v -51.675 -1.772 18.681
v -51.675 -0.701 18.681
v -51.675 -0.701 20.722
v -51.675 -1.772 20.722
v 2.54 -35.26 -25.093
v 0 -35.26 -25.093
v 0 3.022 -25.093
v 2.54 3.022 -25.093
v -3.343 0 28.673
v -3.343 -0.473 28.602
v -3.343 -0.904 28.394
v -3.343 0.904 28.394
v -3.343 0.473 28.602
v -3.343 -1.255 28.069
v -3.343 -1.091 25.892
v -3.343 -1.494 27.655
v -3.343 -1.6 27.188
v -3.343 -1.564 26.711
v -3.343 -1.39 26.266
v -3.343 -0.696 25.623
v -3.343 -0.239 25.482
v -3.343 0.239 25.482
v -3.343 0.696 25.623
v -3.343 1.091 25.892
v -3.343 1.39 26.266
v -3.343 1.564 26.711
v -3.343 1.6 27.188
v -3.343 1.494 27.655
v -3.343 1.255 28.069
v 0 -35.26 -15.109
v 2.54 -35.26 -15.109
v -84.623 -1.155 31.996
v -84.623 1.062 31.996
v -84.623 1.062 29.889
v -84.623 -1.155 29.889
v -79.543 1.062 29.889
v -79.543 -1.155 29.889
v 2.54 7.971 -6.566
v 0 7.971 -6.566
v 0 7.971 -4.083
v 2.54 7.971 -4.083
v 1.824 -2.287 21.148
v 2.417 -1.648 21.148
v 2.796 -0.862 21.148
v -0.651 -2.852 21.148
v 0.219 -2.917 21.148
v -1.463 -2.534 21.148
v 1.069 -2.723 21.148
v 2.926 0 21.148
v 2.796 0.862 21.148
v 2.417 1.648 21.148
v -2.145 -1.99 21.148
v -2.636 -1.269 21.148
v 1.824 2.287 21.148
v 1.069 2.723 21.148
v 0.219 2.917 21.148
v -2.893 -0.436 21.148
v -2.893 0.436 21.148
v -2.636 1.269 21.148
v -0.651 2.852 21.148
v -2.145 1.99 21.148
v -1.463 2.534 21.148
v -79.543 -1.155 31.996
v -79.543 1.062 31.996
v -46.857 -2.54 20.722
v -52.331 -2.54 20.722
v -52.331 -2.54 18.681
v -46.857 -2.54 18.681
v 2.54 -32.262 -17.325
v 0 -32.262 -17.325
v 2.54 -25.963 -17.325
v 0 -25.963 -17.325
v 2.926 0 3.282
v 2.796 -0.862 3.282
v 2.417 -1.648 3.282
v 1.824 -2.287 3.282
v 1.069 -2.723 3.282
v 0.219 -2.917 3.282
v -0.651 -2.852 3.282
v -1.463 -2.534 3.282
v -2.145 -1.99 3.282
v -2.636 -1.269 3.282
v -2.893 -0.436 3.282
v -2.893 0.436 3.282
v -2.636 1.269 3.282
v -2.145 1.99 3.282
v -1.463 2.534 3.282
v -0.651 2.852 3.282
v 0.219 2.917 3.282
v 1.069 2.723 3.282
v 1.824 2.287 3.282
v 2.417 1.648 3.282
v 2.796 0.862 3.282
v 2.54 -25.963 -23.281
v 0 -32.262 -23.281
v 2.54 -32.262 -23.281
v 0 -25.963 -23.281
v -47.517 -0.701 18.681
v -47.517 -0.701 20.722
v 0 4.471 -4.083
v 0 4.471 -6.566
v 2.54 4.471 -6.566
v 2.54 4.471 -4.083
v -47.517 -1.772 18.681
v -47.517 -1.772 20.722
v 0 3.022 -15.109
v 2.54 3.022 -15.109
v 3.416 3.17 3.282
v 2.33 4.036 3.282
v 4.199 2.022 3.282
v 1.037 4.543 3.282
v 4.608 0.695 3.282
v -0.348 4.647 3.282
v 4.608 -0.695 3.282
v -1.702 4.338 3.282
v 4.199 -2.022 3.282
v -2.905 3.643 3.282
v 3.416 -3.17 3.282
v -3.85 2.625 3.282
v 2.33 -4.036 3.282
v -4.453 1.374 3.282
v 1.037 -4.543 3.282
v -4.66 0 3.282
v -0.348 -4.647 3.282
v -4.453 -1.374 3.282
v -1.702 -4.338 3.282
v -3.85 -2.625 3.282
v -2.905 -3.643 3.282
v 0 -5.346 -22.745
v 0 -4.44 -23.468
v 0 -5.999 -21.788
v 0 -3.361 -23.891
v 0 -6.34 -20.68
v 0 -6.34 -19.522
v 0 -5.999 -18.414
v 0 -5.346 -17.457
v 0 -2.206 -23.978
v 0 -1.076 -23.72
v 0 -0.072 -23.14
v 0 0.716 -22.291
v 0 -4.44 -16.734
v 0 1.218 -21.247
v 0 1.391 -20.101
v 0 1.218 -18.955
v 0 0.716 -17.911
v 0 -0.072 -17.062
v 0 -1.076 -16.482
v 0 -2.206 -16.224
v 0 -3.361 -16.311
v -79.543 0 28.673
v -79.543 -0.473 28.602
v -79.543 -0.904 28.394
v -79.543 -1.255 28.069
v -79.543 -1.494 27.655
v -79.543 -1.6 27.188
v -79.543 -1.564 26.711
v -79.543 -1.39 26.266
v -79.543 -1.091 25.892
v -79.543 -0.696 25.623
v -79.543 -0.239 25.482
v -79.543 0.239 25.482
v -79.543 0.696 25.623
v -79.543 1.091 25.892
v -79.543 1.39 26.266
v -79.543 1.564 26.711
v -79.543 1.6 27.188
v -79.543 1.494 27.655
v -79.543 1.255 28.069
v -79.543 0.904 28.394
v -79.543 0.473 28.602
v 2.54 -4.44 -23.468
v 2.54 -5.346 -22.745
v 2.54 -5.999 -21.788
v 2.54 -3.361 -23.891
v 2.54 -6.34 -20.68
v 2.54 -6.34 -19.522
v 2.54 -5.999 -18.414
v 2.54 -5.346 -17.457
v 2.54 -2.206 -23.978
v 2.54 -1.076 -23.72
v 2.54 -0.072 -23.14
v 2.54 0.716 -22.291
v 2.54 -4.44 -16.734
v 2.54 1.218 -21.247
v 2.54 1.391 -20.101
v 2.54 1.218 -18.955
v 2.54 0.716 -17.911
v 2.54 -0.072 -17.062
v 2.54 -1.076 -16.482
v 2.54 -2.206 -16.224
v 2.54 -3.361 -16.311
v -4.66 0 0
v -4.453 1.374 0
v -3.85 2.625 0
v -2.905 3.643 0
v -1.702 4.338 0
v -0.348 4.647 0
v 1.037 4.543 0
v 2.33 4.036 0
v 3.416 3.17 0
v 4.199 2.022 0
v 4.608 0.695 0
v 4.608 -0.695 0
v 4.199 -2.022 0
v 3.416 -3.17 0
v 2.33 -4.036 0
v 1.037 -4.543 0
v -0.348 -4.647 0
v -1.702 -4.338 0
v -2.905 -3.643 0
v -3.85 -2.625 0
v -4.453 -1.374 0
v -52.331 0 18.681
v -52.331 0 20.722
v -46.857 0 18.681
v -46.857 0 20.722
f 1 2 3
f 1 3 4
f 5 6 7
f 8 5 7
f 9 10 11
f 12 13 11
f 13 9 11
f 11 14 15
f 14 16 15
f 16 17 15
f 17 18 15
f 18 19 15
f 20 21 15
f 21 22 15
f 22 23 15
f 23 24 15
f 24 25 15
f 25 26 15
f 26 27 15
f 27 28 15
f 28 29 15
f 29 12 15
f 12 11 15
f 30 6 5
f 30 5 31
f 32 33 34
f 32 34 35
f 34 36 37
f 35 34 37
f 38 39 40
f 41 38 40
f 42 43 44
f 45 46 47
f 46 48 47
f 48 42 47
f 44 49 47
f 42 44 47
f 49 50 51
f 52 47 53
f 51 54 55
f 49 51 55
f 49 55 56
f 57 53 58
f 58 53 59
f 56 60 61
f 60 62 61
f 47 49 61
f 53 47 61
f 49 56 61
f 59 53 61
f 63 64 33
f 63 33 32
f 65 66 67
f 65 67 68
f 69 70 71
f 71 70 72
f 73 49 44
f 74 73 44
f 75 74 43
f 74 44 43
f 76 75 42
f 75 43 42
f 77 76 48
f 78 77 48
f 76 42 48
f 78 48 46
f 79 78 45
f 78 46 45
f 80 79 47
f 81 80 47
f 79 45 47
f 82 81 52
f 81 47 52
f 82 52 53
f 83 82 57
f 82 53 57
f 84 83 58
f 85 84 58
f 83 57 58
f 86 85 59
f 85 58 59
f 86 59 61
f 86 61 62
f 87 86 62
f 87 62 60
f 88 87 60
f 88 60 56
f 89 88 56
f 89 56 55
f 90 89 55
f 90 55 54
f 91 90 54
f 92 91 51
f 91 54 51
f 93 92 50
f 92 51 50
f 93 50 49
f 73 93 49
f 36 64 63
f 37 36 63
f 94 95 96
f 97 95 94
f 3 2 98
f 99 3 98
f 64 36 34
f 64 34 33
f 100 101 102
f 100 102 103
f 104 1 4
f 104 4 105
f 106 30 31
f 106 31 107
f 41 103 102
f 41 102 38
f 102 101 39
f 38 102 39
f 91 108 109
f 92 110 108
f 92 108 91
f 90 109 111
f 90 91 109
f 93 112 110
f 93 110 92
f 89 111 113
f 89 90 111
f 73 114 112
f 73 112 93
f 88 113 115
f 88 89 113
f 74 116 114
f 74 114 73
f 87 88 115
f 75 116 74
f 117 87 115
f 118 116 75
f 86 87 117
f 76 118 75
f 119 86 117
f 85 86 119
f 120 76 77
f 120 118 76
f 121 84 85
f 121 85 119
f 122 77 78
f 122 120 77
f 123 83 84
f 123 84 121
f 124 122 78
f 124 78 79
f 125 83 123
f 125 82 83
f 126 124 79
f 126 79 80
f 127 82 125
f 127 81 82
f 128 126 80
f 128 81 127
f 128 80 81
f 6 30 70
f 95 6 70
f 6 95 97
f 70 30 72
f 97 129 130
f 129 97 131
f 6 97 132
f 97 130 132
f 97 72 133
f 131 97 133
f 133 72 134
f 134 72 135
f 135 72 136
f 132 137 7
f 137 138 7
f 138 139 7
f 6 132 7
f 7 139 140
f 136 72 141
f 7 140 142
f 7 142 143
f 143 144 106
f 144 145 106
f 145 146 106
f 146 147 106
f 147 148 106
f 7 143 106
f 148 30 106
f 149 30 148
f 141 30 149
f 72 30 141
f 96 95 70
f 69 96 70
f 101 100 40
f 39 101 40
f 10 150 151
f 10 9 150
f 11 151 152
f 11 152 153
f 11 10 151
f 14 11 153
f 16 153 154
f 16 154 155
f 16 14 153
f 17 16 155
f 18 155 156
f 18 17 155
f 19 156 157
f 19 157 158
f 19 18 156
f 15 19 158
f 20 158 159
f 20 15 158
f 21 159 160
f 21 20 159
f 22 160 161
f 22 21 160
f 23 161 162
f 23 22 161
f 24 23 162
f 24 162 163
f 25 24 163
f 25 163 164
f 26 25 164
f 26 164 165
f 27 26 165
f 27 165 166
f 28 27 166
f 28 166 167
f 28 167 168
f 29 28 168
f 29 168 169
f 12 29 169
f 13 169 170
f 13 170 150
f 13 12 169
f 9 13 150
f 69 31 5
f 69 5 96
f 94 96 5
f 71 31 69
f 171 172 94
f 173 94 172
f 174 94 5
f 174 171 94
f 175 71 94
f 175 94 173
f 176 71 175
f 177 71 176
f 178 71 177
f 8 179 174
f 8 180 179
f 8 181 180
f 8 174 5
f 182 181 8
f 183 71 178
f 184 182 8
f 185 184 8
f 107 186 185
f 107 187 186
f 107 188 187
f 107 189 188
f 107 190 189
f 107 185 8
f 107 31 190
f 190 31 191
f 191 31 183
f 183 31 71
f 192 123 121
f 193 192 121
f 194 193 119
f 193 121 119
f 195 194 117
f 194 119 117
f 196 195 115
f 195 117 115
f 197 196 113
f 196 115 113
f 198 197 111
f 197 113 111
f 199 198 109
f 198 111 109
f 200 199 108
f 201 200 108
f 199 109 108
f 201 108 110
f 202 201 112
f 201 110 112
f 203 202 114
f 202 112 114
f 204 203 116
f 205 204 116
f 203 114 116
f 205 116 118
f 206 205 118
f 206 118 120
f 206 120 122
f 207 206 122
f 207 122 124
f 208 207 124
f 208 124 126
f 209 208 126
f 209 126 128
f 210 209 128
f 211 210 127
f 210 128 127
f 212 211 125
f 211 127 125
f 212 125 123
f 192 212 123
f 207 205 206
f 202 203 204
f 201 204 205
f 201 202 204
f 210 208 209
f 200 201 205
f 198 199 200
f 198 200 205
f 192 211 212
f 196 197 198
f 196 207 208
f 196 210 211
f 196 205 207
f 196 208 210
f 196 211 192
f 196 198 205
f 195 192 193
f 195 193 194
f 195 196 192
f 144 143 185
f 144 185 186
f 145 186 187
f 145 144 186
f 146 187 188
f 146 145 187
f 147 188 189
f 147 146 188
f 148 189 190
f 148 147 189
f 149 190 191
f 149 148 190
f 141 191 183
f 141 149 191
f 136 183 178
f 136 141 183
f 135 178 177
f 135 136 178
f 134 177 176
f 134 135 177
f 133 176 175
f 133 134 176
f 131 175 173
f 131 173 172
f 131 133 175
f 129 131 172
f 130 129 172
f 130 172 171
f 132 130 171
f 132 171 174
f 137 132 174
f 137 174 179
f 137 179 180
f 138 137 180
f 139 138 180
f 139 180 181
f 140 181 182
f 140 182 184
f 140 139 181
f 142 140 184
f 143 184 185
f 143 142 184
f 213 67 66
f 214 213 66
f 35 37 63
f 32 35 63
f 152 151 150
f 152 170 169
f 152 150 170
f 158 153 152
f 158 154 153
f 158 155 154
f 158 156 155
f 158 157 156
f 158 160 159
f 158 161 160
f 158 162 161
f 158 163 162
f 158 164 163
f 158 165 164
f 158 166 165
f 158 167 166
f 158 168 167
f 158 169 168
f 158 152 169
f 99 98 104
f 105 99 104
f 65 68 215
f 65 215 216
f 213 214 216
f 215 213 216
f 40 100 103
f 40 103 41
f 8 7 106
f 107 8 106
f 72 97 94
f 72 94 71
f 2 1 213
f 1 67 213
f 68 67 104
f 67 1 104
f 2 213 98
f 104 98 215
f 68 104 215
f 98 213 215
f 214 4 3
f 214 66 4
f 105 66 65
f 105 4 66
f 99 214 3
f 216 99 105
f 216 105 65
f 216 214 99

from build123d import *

# Parameters (mm, degrees)
F0_W      = 4.6600201167
F0_H      = 21.1479533464
F2_W      = 76.2
F2_H      = 1.6046876216
F4_W      = 2.5020283647
F4_H      = 18.3248373214
F6_W      = 2.2167799762
F6_H      = 2.1073091775
F7_DEPTH  = 5.08
F10_W     = 38.2821860258
F10_H     = 9.9848276004
F10_W_2   = 6.2995692715
F10_H_2   = 5.9559568763
F10_R     = 3.8874076759
F11_DEPTH = 2.54
F12_W     = 3.4997598268
F12_H     = 2.4837013334
F13_DEPTH = 2.54
F14_W     = 5.4736100137
F14_H     = 2.0410064608
F15_DEPTH = 2.54
F16_W     = 4.1583329439
F16_H     = 1.0704973829
F17_DEPTH = 13.3158767054


# Not quite as in the source:
# - a feature of the source that left no trace in its solid (it failed there, or was rolled back) is left out


with BuildPart() as f1:
    # F0 (on Front) → F1 (revolve)
    with BuildSketch(Plane.XZ):
        with Locations((-2.3300100584, 10.5739766732)):
            Rectangle(F0_W, F0_H)
    revolve(axis=Axis((0, 0, 10.5739766732), (0, 0, -1)))

    # F4 (on Front) → F5 (revolve, cut)
    with BuildSketch(Plane.XZ):
        with Locations((4.1766406503, 12.4440173386)):
            Rectangle(F4_W, F4_H)
    revolve(axis=Axis((0, 0, 21.1479533464), (0, 0, -1)), mode=Mode.SUBTRACT)


with BuildPart() as f3:
    # F2 (on Front) → F3 (revolve)
    with BuildSketch(Plane.XZ):
        with Locations((-41.4429178875, 27.8707629937)):
            Rectangle(F2_W, F2_H)
    revolve(axis=Axis((-41.4429178875, 0, 27.0684191829), (1, 0, 0)))


with BuildPart() as f7:
    # F6 (on face) → F7 (new body)
    with BuildSketch(Plane(origin=(-79.5429178875, 0, 0), x_dir=(0, -1, 0), z_dir=(-1, 0, 0))):
        with Locations((0.046658155, 30.9424130246)):
            Rectangle(F6_W, F6_H)
    extrude(amount=F7_DEPTH)


with BuildPart() as f11:
    # F10 (on Right) → F11 (new body)
    with BuildSketch(Plane.YZ):
        with Locations((-16.1193663953, -20.1010354795)):
            Rectangle(F10_W, F10_H)
        with Locations((-29.1127148084, -20.3032046556)):
            Rectangle(F10_W_2, F10_H_2, mode=Mode.SUBTRACT)
        with Locations((-2.4962052703, -20.1010350138)):
            Circle(F10_R, mode=Mode.SUBTRACT)
    extrude(amount=F11_DEPTH)


with BuildPart() as f13:
    # F12 (on Right) → F13 (new body)
    with BuildSketch(Plane.YZ):
        with Locations((6.2213118654, -5.3245727904)):
            Rectangle(F12_W, F12_H)
    extrude(amount=F13_DEPTH)


with BuildPart() as f15:
    # F14 (on Front) → F15 (new body)
    with BuildSketch(Plane.XZ):
        with Locations((-49.5937671512, 19.7016941383)):
            Rectangle(F14_W, F14_H)
    extrude(amount=F15_DEPTH)

    # F16 (on face) → F17 (cut, through all)
    with BuildSketch(Plane(origin=(0, 0, 18.681190908), x_dir=(1, 0, 0), z_dir=(0, 0, -1))):
        with Locations((-49.5957992971, 1.2363959977)):
            Rectangle(F16_W, F16_H)
    extrude(amount=-F17_DEPTH, mode=Mode.SUBTRACT)


solid = Compound([f1.part, f3.part, f7.part, f11.part, f13.part, f15.part])
